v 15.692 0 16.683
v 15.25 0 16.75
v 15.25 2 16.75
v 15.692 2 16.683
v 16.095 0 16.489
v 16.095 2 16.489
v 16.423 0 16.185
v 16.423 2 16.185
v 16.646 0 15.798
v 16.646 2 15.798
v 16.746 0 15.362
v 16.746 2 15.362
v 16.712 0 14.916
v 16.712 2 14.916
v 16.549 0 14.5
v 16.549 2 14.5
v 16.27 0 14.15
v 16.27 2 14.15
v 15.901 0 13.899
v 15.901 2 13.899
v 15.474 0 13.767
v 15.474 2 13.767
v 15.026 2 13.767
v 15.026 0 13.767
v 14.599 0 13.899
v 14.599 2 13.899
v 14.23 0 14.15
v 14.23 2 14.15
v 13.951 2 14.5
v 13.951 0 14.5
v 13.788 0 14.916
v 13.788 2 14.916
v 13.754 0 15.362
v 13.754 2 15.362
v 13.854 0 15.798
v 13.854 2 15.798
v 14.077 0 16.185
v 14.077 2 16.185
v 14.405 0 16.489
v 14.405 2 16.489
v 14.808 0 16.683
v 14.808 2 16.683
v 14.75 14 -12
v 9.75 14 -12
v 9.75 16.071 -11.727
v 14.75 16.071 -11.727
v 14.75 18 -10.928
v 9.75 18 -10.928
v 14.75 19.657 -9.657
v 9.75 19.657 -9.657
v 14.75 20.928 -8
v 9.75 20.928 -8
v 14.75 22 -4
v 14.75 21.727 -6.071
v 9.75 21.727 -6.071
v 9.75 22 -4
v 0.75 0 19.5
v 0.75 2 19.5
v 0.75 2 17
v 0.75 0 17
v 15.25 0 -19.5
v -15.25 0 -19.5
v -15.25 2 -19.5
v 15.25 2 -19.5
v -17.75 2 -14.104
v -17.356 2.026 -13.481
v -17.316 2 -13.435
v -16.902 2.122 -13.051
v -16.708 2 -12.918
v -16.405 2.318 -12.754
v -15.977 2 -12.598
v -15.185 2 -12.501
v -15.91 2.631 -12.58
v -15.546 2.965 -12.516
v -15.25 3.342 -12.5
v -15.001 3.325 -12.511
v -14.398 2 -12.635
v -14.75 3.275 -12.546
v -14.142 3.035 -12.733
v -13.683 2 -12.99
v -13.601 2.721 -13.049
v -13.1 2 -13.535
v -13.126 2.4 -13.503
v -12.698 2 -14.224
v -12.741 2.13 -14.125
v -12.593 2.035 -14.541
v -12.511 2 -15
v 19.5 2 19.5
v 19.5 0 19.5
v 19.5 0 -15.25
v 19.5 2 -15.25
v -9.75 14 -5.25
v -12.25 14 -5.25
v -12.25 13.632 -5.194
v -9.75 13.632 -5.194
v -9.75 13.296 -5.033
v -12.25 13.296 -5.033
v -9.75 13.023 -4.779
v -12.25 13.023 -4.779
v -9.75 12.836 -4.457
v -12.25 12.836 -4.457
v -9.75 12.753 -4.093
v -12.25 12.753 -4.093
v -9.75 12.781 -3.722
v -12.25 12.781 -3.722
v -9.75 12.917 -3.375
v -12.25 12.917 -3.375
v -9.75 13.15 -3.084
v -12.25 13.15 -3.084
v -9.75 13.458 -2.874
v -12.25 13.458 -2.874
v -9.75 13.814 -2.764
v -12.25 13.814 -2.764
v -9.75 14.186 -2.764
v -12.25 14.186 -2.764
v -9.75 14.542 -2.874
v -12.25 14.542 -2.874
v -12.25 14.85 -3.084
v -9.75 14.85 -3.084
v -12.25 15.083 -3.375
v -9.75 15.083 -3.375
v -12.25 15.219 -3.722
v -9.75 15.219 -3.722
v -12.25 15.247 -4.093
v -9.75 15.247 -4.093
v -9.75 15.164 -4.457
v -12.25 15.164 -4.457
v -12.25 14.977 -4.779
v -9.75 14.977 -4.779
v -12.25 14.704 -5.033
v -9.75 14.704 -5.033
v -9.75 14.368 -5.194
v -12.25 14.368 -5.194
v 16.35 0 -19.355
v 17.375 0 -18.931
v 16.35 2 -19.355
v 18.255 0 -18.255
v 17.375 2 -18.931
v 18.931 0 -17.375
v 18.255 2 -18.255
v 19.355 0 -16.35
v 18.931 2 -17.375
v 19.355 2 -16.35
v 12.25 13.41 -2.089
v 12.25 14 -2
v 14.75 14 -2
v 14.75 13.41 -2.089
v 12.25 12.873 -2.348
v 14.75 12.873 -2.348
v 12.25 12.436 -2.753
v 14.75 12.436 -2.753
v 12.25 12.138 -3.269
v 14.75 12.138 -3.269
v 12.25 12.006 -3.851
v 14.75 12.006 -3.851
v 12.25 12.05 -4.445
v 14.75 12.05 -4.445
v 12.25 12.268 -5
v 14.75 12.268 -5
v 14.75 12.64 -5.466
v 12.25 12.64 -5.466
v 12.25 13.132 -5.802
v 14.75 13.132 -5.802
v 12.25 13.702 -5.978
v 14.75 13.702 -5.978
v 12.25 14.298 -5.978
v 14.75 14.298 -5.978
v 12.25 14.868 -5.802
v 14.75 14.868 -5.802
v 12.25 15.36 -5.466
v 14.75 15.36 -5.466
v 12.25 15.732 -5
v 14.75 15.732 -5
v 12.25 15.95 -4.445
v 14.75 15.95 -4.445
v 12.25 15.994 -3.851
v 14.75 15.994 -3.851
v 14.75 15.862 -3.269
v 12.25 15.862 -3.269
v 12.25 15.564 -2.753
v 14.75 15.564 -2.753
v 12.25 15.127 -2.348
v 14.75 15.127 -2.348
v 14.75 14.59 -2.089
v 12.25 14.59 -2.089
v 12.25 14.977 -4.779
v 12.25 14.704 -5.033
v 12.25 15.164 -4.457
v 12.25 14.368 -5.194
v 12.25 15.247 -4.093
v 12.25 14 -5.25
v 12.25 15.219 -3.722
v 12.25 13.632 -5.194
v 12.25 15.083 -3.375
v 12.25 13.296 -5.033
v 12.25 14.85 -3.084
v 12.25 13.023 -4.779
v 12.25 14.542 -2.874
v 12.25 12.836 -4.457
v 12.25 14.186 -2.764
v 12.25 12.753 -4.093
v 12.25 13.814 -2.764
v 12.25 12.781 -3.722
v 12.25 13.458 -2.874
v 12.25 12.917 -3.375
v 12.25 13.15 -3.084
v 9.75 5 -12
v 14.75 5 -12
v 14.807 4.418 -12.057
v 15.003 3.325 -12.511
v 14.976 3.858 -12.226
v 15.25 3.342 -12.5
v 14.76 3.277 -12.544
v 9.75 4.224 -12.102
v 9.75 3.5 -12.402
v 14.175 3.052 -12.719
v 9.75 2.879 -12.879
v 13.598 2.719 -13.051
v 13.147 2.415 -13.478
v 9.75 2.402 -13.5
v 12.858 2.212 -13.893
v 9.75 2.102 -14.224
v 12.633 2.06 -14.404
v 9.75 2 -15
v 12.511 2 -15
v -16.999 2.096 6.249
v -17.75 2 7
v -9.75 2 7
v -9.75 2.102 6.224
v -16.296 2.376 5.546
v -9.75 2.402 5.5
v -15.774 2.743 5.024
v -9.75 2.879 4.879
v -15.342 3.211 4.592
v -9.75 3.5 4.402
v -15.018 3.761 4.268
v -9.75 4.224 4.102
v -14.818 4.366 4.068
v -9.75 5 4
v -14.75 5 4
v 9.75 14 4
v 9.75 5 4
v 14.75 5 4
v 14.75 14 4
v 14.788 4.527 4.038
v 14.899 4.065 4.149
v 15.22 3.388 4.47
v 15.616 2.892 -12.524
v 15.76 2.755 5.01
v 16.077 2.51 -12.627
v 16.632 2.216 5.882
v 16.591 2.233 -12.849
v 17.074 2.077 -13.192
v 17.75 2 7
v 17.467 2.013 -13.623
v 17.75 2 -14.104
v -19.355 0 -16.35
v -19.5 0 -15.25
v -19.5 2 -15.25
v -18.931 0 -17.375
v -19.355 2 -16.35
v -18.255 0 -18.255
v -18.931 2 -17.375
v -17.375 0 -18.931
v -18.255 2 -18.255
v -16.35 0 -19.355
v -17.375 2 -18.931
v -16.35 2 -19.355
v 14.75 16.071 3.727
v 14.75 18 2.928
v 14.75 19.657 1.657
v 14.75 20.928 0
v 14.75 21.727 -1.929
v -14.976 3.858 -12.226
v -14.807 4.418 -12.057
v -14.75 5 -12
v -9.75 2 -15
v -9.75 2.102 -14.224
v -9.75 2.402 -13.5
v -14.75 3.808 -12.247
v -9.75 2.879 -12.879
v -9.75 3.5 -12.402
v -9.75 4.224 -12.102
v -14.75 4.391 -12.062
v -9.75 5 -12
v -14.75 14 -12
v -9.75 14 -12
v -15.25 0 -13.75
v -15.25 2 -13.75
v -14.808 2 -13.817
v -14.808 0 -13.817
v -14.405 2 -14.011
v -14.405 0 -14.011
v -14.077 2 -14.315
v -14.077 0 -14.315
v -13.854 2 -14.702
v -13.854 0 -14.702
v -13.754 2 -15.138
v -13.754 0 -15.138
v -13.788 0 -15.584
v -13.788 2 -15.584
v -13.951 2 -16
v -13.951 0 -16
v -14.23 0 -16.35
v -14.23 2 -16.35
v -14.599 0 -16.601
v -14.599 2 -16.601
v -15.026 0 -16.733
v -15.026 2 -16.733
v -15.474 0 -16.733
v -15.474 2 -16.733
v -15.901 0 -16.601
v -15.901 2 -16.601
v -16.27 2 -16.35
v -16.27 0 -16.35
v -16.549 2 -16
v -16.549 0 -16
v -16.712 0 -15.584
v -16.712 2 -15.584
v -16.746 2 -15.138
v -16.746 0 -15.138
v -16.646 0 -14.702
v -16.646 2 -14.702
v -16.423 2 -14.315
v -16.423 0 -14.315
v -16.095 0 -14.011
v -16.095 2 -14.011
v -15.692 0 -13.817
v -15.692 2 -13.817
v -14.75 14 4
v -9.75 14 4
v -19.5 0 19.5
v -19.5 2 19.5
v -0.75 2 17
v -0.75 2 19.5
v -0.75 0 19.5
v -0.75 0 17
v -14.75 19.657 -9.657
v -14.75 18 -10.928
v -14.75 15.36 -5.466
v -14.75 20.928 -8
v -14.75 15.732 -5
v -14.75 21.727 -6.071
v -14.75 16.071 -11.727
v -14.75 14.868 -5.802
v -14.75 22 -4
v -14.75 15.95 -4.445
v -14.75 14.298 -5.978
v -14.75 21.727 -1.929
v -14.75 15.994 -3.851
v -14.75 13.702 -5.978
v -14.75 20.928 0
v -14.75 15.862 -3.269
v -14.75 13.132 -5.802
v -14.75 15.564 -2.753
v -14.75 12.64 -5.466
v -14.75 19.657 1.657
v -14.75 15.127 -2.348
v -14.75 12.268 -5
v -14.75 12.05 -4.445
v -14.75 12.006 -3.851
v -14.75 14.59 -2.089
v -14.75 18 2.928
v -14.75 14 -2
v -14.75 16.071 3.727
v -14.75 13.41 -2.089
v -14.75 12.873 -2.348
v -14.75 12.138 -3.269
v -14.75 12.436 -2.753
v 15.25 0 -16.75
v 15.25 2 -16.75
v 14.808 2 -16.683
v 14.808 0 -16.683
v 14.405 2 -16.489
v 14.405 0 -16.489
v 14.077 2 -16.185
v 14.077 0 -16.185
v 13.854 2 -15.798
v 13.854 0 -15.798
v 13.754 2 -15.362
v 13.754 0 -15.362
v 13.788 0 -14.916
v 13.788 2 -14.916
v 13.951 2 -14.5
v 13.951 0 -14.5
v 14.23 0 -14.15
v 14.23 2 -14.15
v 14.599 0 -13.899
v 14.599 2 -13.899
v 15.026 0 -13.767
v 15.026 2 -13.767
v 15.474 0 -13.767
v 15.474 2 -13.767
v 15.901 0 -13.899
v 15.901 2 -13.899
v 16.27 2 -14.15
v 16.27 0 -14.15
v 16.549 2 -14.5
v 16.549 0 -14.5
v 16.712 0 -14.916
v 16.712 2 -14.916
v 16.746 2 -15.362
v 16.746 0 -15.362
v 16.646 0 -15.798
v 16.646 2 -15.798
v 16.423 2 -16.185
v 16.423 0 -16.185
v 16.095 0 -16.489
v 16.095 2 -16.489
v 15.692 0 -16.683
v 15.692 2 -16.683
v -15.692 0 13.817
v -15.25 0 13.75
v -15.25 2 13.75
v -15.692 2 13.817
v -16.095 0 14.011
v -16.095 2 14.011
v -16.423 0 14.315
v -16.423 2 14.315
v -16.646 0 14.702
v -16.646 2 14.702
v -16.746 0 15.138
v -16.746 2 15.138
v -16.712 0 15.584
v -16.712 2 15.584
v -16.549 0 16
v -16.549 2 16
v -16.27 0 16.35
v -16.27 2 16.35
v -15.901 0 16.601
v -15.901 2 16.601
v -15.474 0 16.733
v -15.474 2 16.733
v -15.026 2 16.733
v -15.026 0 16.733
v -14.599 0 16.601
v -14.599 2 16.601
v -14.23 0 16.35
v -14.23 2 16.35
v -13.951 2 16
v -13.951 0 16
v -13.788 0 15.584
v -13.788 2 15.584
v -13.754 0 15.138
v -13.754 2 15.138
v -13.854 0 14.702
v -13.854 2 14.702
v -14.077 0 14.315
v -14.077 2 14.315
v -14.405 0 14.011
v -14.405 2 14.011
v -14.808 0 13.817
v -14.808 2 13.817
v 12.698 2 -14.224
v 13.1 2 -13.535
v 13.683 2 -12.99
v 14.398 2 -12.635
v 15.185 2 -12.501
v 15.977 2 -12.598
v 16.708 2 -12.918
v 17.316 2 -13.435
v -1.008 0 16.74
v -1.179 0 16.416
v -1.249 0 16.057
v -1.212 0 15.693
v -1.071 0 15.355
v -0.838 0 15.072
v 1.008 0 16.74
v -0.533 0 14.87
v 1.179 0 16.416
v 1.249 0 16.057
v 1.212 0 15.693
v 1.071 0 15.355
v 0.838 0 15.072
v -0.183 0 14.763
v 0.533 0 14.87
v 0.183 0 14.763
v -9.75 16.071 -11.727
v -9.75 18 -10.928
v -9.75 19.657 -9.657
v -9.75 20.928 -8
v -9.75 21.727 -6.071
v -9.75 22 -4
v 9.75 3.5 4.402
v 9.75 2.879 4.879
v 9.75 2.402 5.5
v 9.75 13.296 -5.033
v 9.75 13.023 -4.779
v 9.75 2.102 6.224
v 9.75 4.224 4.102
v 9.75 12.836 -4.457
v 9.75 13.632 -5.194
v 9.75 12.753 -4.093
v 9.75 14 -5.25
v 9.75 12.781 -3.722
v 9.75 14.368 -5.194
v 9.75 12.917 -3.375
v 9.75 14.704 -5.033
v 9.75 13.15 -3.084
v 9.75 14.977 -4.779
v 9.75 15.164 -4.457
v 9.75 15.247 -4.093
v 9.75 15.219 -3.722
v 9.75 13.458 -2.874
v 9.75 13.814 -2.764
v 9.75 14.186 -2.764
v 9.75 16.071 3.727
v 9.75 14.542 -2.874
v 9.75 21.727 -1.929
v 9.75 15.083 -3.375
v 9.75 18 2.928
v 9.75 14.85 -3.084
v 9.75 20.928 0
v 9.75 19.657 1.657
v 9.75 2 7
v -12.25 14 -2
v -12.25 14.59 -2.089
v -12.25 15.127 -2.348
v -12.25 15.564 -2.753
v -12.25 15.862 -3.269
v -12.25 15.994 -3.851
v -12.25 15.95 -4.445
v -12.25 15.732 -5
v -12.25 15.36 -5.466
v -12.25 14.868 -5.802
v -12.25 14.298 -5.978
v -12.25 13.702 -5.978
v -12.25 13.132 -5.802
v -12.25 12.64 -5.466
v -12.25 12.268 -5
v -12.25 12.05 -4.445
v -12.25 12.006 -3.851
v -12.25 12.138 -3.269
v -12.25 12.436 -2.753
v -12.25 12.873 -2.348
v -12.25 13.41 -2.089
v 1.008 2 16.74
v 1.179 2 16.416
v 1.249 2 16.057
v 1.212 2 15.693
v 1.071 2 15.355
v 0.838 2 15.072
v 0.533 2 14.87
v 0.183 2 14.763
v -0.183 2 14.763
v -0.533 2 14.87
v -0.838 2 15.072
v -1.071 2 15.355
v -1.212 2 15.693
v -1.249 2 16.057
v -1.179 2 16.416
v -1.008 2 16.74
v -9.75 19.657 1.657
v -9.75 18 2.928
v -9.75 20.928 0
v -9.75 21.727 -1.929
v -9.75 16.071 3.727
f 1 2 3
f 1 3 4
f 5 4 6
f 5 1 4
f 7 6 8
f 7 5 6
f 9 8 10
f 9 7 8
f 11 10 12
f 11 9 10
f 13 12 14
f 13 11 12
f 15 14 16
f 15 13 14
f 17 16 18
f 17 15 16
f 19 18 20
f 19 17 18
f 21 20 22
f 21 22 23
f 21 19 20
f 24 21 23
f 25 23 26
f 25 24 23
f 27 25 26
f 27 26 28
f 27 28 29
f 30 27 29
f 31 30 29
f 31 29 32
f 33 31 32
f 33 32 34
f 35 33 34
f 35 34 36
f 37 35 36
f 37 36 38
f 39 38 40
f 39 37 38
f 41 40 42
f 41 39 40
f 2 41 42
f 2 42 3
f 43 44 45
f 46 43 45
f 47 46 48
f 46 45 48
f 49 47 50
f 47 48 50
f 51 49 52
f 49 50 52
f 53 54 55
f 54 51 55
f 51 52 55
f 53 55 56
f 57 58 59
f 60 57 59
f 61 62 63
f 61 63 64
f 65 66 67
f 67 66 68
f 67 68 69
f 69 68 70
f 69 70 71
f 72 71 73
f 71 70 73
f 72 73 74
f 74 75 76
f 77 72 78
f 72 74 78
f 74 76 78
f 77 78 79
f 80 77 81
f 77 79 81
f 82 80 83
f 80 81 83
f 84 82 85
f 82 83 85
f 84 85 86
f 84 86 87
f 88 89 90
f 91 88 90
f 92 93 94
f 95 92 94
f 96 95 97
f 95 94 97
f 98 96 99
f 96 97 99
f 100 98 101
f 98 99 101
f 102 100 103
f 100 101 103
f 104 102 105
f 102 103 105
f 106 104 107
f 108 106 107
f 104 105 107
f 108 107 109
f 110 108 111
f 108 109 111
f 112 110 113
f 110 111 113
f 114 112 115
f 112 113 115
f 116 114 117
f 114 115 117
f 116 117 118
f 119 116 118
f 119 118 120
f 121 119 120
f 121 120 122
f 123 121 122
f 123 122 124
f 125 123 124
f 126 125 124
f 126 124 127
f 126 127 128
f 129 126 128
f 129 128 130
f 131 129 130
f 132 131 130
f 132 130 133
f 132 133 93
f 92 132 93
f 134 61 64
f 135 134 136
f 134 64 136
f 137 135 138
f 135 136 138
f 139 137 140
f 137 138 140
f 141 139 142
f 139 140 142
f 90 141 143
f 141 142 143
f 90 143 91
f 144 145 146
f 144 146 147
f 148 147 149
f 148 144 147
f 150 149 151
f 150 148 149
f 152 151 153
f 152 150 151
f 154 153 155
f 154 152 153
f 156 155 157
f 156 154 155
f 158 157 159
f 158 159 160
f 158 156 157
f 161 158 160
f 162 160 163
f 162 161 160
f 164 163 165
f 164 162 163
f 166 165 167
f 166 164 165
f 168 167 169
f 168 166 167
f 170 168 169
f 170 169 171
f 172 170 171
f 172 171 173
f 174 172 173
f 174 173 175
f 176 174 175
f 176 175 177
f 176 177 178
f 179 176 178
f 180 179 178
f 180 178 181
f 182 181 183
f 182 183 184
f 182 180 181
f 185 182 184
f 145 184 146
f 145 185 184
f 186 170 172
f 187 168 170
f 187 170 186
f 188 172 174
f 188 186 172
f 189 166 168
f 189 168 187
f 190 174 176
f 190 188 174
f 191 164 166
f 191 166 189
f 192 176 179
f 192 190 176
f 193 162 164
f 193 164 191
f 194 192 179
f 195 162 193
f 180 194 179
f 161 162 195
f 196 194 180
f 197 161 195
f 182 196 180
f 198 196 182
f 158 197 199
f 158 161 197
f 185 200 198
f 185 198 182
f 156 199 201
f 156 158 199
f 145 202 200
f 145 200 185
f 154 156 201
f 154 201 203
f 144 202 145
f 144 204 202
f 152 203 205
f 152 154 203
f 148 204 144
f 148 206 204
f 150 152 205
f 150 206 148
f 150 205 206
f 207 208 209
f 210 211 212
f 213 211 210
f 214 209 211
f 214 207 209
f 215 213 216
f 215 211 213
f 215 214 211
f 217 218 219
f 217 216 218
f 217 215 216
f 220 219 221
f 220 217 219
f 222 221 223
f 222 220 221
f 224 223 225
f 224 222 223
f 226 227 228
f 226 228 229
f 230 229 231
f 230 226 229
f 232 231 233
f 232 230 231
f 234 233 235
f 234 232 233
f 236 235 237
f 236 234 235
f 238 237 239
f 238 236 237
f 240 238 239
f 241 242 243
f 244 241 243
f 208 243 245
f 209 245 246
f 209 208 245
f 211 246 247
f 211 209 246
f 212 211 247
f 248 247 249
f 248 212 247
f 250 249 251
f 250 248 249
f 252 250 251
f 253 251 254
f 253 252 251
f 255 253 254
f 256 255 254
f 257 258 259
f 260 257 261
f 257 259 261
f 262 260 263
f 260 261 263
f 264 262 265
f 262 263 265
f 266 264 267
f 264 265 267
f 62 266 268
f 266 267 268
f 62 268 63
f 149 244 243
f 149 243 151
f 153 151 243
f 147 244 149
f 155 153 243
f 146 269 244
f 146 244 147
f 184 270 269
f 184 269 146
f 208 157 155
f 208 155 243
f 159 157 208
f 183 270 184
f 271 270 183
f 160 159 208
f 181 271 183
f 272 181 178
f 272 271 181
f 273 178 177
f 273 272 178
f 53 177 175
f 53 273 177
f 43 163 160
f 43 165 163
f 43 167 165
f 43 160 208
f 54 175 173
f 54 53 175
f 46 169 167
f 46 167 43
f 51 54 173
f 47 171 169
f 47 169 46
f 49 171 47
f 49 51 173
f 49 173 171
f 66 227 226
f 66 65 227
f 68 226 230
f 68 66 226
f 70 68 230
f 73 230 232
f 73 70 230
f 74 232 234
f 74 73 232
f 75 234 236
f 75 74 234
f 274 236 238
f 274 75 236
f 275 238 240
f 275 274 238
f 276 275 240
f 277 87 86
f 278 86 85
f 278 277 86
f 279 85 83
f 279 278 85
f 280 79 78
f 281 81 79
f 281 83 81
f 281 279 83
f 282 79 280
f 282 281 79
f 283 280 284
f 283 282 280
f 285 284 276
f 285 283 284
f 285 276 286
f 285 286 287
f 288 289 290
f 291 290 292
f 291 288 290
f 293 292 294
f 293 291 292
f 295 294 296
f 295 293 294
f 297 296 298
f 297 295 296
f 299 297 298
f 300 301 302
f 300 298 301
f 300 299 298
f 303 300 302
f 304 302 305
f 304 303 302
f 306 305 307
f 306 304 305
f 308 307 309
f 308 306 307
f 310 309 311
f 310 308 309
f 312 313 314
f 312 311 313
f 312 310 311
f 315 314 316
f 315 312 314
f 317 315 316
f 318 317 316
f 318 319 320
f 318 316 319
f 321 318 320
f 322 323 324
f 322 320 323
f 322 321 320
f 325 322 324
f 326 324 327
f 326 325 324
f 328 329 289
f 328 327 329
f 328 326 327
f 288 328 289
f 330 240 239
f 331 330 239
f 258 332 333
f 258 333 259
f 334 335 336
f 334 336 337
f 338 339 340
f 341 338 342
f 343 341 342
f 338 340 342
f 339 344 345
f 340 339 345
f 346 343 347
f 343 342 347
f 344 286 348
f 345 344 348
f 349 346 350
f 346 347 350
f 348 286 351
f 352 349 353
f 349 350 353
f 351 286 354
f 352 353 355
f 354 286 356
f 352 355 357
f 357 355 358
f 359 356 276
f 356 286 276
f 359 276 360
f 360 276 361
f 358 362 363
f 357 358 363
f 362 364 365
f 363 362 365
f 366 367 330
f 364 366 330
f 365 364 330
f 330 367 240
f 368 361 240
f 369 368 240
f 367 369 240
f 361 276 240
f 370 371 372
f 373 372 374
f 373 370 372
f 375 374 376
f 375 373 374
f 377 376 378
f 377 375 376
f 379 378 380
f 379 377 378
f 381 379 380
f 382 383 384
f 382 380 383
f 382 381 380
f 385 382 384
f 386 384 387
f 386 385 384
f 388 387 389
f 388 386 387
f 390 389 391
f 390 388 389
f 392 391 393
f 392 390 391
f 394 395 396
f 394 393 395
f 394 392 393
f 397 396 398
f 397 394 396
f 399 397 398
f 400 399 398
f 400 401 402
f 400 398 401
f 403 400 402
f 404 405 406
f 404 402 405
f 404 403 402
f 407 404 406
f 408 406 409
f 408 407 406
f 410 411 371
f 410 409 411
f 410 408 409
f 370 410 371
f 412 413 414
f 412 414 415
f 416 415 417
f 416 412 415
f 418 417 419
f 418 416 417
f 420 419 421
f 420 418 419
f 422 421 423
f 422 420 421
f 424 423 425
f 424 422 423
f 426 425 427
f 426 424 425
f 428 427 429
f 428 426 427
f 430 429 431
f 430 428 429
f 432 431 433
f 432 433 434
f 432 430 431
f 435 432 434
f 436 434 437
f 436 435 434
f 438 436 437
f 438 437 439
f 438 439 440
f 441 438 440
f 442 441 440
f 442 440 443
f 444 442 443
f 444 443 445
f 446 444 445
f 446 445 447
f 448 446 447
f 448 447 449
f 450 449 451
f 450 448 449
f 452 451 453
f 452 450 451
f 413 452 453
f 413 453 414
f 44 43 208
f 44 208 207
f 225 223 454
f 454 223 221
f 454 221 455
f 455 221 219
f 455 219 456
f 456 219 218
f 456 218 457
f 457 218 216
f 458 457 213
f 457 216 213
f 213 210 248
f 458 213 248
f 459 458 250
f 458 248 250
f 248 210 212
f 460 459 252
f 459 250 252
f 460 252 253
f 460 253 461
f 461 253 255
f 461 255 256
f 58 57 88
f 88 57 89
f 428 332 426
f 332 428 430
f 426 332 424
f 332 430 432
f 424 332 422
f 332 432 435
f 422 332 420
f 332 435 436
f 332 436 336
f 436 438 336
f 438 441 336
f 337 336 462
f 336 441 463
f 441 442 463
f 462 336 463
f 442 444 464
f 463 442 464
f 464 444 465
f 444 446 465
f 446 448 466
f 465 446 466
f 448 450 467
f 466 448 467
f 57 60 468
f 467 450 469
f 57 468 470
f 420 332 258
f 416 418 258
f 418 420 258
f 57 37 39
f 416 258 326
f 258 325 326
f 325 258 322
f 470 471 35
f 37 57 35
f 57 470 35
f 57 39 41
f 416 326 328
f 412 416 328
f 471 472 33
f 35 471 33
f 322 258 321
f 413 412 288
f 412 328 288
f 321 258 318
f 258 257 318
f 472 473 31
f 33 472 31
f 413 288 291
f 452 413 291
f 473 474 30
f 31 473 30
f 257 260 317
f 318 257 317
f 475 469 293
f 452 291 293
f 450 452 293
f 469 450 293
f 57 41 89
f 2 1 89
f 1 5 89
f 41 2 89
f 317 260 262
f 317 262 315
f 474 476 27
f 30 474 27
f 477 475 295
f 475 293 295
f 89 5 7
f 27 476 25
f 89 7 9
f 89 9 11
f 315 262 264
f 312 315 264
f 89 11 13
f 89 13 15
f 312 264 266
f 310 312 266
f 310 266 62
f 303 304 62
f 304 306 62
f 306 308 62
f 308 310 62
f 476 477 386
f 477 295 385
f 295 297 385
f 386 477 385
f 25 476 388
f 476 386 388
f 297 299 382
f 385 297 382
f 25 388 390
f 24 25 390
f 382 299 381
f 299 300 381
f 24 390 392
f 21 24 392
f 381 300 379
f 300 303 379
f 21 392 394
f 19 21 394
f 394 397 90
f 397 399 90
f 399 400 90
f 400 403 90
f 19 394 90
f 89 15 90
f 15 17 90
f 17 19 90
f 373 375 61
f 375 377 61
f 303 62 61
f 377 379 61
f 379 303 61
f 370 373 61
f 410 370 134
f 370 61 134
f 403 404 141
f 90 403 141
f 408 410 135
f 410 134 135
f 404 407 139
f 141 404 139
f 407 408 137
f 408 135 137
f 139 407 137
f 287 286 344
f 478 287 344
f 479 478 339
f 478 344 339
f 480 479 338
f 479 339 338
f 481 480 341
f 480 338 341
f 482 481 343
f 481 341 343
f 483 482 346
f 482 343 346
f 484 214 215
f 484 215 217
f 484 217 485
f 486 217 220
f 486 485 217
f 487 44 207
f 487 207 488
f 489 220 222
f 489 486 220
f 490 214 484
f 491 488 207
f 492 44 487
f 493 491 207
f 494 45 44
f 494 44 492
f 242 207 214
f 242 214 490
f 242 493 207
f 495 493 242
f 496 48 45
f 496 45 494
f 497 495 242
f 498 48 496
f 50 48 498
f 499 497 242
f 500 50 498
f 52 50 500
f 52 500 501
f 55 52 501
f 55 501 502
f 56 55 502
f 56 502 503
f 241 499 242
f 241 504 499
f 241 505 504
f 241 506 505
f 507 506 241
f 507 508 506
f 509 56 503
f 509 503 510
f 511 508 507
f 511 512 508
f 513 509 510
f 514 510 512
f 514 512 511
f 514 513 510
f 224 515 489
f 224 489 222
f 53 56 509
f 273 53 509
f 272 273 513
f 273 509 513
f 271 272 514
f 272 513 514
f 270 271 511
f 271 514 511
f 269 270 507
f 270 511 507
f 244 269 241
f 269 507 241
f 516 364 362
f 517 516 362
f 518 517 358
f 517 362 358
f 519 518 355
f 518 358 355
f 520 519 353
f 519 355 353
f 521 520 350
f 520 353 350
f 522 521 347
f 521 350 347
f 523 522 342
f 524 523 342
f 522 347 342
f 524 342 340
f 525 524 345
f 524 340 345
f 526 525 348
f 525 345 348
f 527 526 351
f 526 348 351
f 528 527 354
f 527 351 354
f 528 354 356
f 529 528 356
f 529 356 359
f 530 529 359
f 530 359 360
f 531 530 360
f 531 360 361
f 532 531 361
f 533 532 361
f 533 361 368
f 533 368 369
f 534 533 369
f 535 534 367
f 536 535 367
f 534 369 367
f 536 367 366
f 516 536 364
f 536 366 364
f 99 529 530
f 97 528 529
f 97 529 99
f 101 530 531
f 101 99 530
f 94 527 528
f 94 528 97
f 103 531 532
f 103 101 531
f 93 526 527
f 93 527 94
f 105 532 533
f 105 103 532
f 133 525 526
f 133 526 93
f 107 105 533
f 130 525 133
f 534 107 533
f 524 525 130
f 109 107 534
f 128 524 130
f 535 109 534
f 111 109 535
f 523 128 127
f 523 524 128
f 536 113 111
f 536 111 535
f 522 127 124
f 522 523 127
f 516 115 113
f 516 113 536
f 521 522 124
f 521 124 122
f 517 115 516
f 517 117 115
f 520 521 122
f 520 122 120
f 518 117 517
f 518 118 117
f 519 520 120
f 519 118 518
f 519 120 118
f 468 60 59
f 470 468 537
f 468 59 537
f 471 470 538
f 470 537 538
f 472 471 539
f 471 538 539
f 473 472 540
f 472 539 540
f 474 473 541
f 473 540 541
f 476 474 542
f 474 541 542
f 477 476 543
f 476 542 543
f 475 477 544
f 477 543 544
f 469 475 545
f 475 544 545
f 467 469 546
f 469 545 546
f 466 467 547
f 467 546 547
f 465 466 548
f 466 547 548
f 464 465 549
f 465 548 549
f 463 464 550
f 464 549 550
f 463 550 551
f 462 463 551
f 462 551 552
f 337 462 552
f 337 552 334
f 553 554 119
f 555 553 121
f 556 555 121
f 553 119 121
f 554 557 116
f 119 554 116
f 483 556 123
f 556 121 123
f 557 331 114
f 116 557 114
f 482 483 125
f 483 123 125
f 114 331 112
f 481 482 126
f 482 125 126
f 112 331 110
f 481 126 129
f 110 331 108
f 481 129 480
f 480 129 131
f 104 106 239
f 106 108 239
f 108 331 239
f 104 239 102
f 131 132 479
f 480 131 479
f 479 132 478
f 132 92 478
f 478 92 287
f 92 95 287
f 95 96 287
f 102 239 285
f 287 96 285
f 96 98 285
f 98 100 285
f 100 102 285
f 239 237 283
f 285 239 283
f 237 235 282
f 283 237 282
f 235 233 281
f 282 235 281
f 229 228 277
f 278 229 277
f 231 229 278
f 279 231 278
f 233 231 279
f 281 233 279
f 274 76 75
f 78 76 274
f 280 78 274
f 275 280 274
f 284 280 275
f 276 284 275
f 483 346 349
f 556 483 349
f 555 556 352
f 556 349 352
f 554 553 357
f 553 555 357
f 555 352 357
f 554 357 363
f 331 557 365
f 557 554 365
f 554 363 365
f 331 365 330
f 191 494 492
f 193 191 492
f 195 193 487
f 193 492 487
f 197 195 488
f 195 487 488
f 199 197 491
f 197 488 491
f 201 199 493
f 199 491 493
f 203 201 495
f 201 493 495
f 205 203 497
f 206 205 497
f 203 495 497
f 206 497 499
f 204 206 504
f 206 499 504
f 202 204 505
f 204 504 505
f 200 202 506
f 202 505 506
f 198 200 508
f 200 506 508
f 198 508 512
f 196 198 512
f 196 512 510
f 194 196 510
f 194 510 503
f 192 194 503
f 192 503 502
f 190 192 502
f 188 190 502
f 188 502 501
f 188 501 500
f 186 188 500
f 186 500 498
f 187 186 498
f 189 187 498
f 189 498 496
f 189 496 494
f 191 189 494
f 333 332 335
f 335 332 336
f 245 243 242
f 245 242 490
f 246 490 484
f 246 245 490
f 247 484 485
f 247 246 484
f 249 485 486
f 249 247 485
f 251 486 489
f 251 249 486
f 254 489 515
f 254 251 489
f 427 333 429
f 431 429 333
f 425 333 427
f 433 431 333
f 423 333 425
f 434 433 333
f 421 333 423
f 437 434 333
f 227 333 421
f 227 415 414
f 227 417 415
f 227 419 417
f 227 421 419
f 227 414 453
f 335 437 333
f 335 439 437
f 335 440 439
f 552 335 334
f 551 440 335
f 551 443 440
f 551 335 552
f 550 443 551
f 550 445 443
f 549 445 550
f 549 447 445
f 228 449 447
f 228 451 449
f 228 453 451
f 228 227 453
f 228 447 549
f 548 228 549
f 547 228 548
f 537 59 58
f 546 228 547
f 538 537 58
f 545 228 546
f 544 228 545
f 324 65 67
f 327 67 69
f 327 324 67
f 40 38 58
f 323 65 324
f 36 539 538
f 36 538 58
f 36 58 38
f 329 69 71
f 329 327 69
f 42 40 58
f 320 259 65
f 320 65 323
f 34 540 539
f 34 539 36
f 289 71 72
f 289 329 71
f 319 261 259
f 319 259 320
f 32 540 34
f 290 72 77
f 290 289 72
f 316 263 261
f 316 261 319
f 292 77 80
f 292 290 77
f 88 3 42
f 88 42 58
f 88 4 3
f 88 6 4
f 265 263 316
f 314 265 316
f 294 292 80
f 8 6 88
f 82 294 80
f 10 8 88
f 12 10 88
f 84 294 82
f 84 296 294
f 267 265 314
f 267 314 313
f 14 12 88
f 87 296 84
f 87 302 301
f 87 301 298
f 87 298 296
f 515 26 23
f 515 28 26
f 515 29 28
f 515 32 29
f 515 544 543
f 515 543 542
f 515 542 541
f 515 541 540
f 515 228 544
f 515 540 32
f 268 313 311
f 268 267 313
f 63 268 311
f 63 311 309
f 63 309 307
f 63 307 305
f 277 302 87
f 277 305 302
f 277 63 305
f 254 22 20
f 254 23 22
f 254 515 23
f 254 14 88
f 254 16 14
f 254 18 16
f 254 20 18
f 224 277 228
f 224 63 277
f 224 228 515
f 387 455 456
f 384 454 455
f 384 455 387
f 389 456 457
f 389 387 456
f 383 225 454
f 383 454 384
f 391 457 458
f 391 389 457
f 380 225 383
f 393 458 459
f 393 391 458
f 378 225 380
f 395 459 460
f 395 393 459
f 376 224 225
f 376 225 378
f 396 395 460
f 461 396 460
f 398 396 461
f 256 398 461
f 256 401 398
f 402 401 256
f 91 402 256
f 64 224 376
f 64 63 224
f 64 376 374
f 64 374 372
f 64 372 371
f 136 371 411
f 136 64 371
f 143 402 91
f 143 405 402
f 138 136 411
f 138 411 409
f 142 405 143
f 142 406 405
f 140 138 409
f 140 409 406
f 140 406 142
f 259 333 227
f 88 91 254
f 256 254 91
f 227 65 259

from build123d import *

# Parameters (mm, degrees)
SKETCH1_W           = 39
SKETCH1_H           = 39
SKETCH1_R           = 1.5
BOSS_EXTRUDE1_DEPTH = 2
SKETCH2_W           = 5
SKETCH2_H           = 16
BOSS_EXTRUDE2_DEPTH = 20
CUT_EXTRUDE1_REACH  = 47.137
SKETCH3_R           = 1.25
CUT_EXTRUDE2_REACH  = 36.066
SKETCH4_R           = 1.25
SKETCH4_W           = 1.5
SKETCH4_H           = 3.5
FILLET1_R           = 3
SKETCH6_R           = 2
CUT_EXTRUDE3_DEPTH  = 2.5
CUT_EXTRUDE4_START  = -2.5
SKETCH7_R           = 2
CUT_EXTRUDE4_DEPTH  = 2.5
SKETCH8_R           = 2.75
CUT_EXTRUDE5_DEPTH  = 20


with BuildPart() as part:
    # Sketch1 → Boss-Extrude1 (new body)
    with BuildSketch(Plane(origin=(0, 0, 0), x_dir=(1, 0, 0), z_dir=(0, 1, 0))):
        Rectangle(SKETCH1_W, SKETCH1_H)
        with Locations(Location((-15.25, 15.25, 0), (0, 0, 270))):
            Circle(SKETCH1_R, mode=Mode.SUBTRACT)
        with Locations(Location((15.25, 15.25, 0), (0, 0, 90))):
            Circle(SKETCH1_R, mode=Mode.SUBTRACT)
        with Locations(Location((15.25, -15.25, 0), (0, 0, 270))):
            Circle(SKETCH1_R, mode=Mode.SUBTRACT)
        with Locations(Location((-15.25, -15.25, 0), (0, 0, 90))):
            Circle(SKETCH1_R, mode=Mode.SUBTRACT)
    extrude(amount=BOSS_EXTRUDE1_DEPTH)

    # Sketch2 → Boss-Extrude2 (add)
    with BuildSketch(Plane(origin=(0, 2, 0), x_dir=(1, 0, 0), z_dir=(0, 1, 0))):
        with Locations((-12.25, 4)):
            Rectangle(SKETCH2_W, SKETCH2_H)
        with Locations((12.25, 4)):
            Rectangle(SKETCH2_W, SKETCH2_H)
    extrude(amount=BOSS_EXTRUDE2_DEPTH)

    # Cut-Extrude1: up to this face of the body (flat: up to its plane)
    cut_extrude1_end = Plane(part.part.faces().sort_by_distance((14.75, 12, -4))[0])
    # Sketch3 → Cut-Extrude1 (cut, up to the picked face)
    with BuildSketch(Plane.ZY.offset(14.75), mode=Mode.PRIVATE) as cut_extrude1_sk1:
        with BuildLine():
            Line((-12, 22), (-12, 14))
            ThreePointArc((-12, 14), (-9.656854249, 19.656854249), (-4, 22))
            Line((-4, 22), (-12, 22))
        make_face()
    cut_extrude1_tool1 = split(extrude(cut_extrude1_sk1.sketch, amount=-CUT_EXTRUDE1_REACH, mode=Mode.PRIVATE), bisect_by=cut_extrude1_end, keep=Keep.BOTH, mode=Mode.PRIVATE)
    # Sketch3 → Cut-Extrude1 (cut, up to the picked face)
    with BuildSketch(Plane.ZY.offset(14.75), mode=Mode.PRIVATE) as cut_extrude1_sk2:
        with BuildLine():
            ThreePointArc((-4, 22), (1.656854249, 19.656854249), (4, 14))
            Line((4, 14), (4, 22))
            Line((4, 22), (-4, 22))
        make_face()
    cut_extrude1_tool2 = split(extrude(cut_extrude1_sk2.sketch, amount=-CUT_EXTRUDE1_REACH, mode=Mode.PRIVATE), bisect_by=cut_extrude1_end, keep=Keep.BOTH, mode=Mode.PRIVATE)
    # Sketch3 → Cut-Extrude1 (cut, up to the picked face)
    with BuildSketch(Plane.ZY.offset(14.75), mode=Mode.PRIVATE) as cut_extrude1_sk3:
        with Locations(Location((-4, 14, 0), (0, 0, 180))):
            Circle(SKETCH3_R)
    cut_extrude1_tool3 = split(extrude(cut_extrude1_sk3.sketch, amount=-CUT_EXTRUDE1_REACH, mode=Mode.PRIVATE), bisect_by=cut_extrude1_end, keep=Keep.BOTH, mode=Mode.PRIVATE)
    add(cut_extrude1_tool1.solids().sort_by(Axis((-14.75, 20.213056, -10.213056), (1, 0, 0)))[0], mode=Mode.SUBTRACT)
    add(cut_extrude1_tool2.solids().sort_by(Axis((-14.75, 20.213056, 2.213056), (1, 0, 0)))[0], mode=Mode.SUBTRACT)
    add(cut_extrude1_tool3.solids().sort_by(Axis((-14.75, 14, -4), (1, 0, 0)))[0], mode=Mode.SUBTRACT)

    # Sketch4 → Cut-Extrude2 (cut, up to next)
    with BuildSketch(Plane(origin=(0, 2, 0), x_dir=(1, 0, 0), z_dir=(0, 1, 0)), mode=Mode.PRIVATE) as cut_extrude2_sk1:
        with BuildLine():
            Line((-19.5, 19.5), (-19.5, 15.25))
            ThreePointArc((-19.5, 15.25), (-18.25520382, 18.25520382), (-15.249999999, 19.5))
            Line((-15.249999999, 19.5), (-19.5, 19.5))
        make_face()
    cut_extrude2_tool1 = extrude(cut_extrude2_sk1.sketch, amount=-CUT_EXTRUDE2_REACH, mode=Mode.PRIVATE) & part.part
    # Sketch4 → Cut-Extrude2 (cut, up to next)
    with BuildSketch(Plane(origin=(0, 2, 0), x_dir=(1, 0, 0), z_dir=(0, 1, 0)), mode=Mode.PRIVATE) as cut_extrude2_sk2:
        with BuildLine():
            ThreePointArc((15.25, 19.5), (18.25520382, 18.25520382), (19.5, 15.25))
            Line((19.5, 15.25), (19.5, 19.5))
            Line((19.5, 19.5), (15.25, 19.5))
        make_face()
    cut_extrude2_tool2 = extrude(cut_extrude2_sk2.sketch, amount=-CUT_EXTRUDE2_REACH, mode=Mode.PRIVATE) & part.part
    # Sketch4 → Cut-Extrude2 (cut, up to next)
    with BuildSketch(Plane(origin=(0, 2, 0), x_dir=(1, 0, 0), z_dir=(0, 1, 0)), mode=Mode.PRIVATE) as cut_extrude2_sk3:
        with Locations((0, -16)):
            Circle(SKETCH4_R)
    cut_extrude2_tool3 = extrude(cut_extrude2_sk3.sketch, amount=-CUT_EXTRUDE2_REACH, mode=Mode.PRIVATE) & part.part
    # Sketch4 → Cut-Extrude2 (cut, up to next)
    with BuildSketch(Plane(origin=(0, 2, 0), x_dir=(1, 0, 0), z_dir=(0, 1, 0)), mode=Mode.PRIVATE) as cut_extrude2_sk4:
        with Locations((0, -17.75)):
            Rectangle(SKETCH4_W, SKETCH4_H)
    cut_extrude2_tool4 = extrude(cut_extrude2_sk4.sketch, amount=-CUT_EXTRUDE2_REACH, mode=Mode.PRIVATE) & part.part
    add(cut_extrude2_tool1.solids().sort_by_distance((-18.550686, 2, -18.550686))[0], mode=Mode.SUBTRACT)
    add(cut_extrude2_tool2.solids().sort_by_distance((18.550686, 2, -18.550686))[0], mode=Mode.SUBTRACT)
    add(cut_extrude2_tool3.solids().sort_by_distance((0, 2, 16))[0], mode=Mode.SUBTRACT)
    add(cut_extrude2_tool4.solids().sort_by_distance((0, 2, 17.75))[0], mode=Mode.SUBTRACT)

    # Fillet1
    # the kernel refuses this fillet: 3 mm, written as the material it adds along each edge
    with BuildSketch(Plane(origin=(-9.75, 2, -12), x_dir=(0, 0, -1), z_dir=(-1, 0, 0))) as fillet1_piece_1_section:
        with BuildLine():
            CenterArc((FILLET1_R, -FILLET1_R), FILLET1_R, 90, 90)
            Line((0, -FILLET1_R), (0, 0))
            Line((0, 0), (FILLET1_R, 0))
        make_face()
    fillet1_piece_1 = extrude(amount=5, mode=Mode.PRIVATE)
    fillet1_piece_1 = fillet1_piece_1 - Plane(origin=(-15.25, 2.68425546, -15.25), x_dir=(0, 0, 1), z_dir=(0, -1, 0)) * Cylinder(1.5, 23, mode=Mode.PRIVATE)
    add(fillet1_piece_1)
    with BuildSketch(Plane(origin=(-14.75, 2, -12), x_dir=(-1, 0, 0), z_dir=(0, 0, 1))) as fillet1_piece_2:
        with BuildLine():
            CenterArc((FILLET1_R, -FILLET1_R), FILLET1_R, 90, 90)
            Line((0, -FILLET1_R), (0, 0))
            Line((0, 0), (FILLET1_R, 0))
        make_face()
    extrude(amount=16)
    with BuildSketch(Plane(origin=(-14.75, 2, 4), x_dir=(0, 0, 1), z_dir=(1, 0, 0))) as fillet1_piece_3:
        with BuildLine():
            CenterArc((FILLET1_R, -FILLET1_R), FILLET1_R, 90, 90)
            Line((0, -FILLET1_R), (0, 0))
            Line((0, 0), (FILLET1_R, 0))
        make_face()
    extrude(amount=5)
    with BuildSketch(Plane(origin=(14.75, 2, 4), x_dir=(0, 0, 1), z_dir=(-1, 0, 0))) as fillet1_piece_4:
        with BuildLine():
            CenterArc((FILLET1_R, FILLET1_R), FILLET1_R, 180, 90)
            Line((0, FILLET1_R), (0, 0))
            Line((0, 0), (FILLET1_R, 0))
        make_face()
    extrude(amount=5)
    with BuildSketch(Plane(origin=(14.75, 2, -12), x_dir=(1, 0, 0), z_dir=(0, 0, 1))) as fillet1_piece_5:
        with BuildLine():
            CenterArc((FILLET1_R, FILLET1_R), FILLET1_R, 180, 90)
            Line((0, FILLET1_R), (0, 0))
            Line((0, 0), (FILLET1_R, 0))
        make_face()
    extrude(amount=16)
    with BuildSketch(Plane(origin=(9.75, 2, -12), x_dir=(0, 0, -1), z_dir=(1, 0, 0))) as fillet1_piece_6_section:
        with BuildLine():
            CenterArc((FILLET1_R, FILLET1_R), FILLET1_R, 180, 90)
            Line((0, FILLET1_R), (0, 0))
            Line((0, 0), (FILLET1_R, 0))
        make_face()
    fillet1_piece_6 = extrude(amount=5, mode=Mode.PRIVATE)
    fillet1_piece_6 = fillet1_piece_6 - Plane(origin=(15.25, 2.684255461, -15.25), x_dir=(0, 0, -1), z_dir=(0, -1, 0)) * Cylinder(1.5, 22, mode=Mode.PRIVATE)
    add(fillet1_piece_6)
    with BuildSketch(Plane(origin=(-9.75, 2, -12), x_dir=(0, 0, -1), z_dir=(-1, 0, 0))) as fillet1_piece_7a_section:
        with BuildLine():
            CenterArc((FILLET1_R, -FILLET1_R), FILLET1_R, 90, 90)
            Line((0, -FILLET1_R), (0, 0))
            Line((0, 0), (FILLET1_R, 0))
        make_face()
    fillet1_piece_7a = extrude(amount=12.5, mode=Mode.PRIVATE)
    fillet1_piece_7a = split(fillet1_piece_7a, bisect_by=Plane(origin=(-19.5, 2.695389127, -12.63970839), z_dir=(1, 0, 0)), keep=Keep.TOP, mode=Mode.PRIVATE)
    fillet1_piece_7a = fillet1_piece_7a - Plane(origin=(-15.25, 2.695389127, -15.25), x_dir=(0, 0, 1), z_dir=(0, -1, 0)) * Cylinder(1.5, 37, mode=Mode.PRIVATE)
    fillet1_piece_7a = split(fillet1_piece_7a, bisect_by=Plane(origin=(-14.75, 2.695389127, -12.63970839), z_dir=(-1, 0, 0)), keep=Keep.TOP, mode=Mode.PRIVATE)
    with BuildSketch(Plane(origin=(-14.75, 2, -19.5), x_dir=(-1, 0, 0), z_dir=(0, 0, 1))) as fillet1_piece_7b_section:
        with BuildLine():
            CenterArc((FILLET1_R, -FILLET1_R), FILLET1_R, 90, 90)
            Line((0, -FILLET1_R), (0, 0))
            Line((0, 0), (FILLET1_R, 0))
        make_face()
    fillet1_piece_7b = extrude(amount=23.5, mode=Mode.PRIVATE)
    fillet1_piece_7b = fillet1_piece_7b & Plane(origin=(-15.25, 2.080720084, -15.25), x_dir=(-1, 0, 0), z_dir=(0, 1, 0)) * Cylinder(4.25, 59, mode=Mode.PRIVATE)
    fillet1_piece_7b = fillet1_piece_7b - Plane(origin=(-15.25, 2.080720084, -15.25), x_dir=(0, 0, 1), z_dir=(0, -1, 0)) * Cylinder(1.5, 59, mode=Mode.PRIVATE)
    fillet1_piece_7b = split(fillet1_piece_7b, bisect_by=Plane(origin=(-16.967781304, 2.080720084, -12), z_dir=(0, 0, -1)), keep=Keep.TOP, mode=Mode.PRIVATE)
    fillet1_piece_7 = fillet1_piece_7a & fillet1_piece_7b
    add(fillet1_piece_7)
    with BuildSketch(Plane(origin=(-22.25, 2, 4), x_dir=(0, 0, 1), z_dir=(1, 0, 0))) as fillet1_piece_8a_section:
        with BuildLine():
            CenterArc((FILLET1_R, -FILLET1_R), FILLET1_R, 90, 90)
            Line((0, -FILLET1_R), (0, 0))
            Line((0, 0), (FILLET1_R, 0))
        make_face()
    fillet1_piece_8a = extrude(amount=12.5, mode=Mode.PRIVATE)
    fillet1_piece_8a = split(fillet1_piece_8a, bisect_by=Plane(origin=(-19.5, 2.679185343, 4.679185343), z_dir=(1, 0, 0)), keep=Keep.TOP, mode=Mode.PRIVATE)
    fillet1_piece_8a = split(fillet1_piece_8a, bisect_by=Plane(origin=(-14.75, 2.679185343, 4.679185343), z_dir=(-1, 0, 0)), keep=Keep.TOP, mode=Mode.PRIVATE)
    with BuildSketch(Plane(origin=(-14.75, 2, -12), x_dir=(-1, 0, 0), z_dir=(0, 0, 1))) as fillet1_piece_8b_section:
        with BuildLine():
            CenterArc((FILLET1_R, -FILLET1_R), FILLET1_R, 90, 90)
            Line((0, -FILLET1_R), (0, 0))
            Line((0, 0), (FILLET1_R, 0))
        make_face()
    fillet1_piece_8b = extrude(amount=23.5, mode=Mode.PRIVATE)
    fillet1_piece_8b = split(fillet1_piece_8b, bisect_by=Plane(origin=(-15.429185343, 2.679185343, 4), z_dir=(0, 0, 1)), keep=Keep.TOP, mode=Mode.PRIVATE)
    fillet1_piece_8 = fillet1_piece_8a & fillet1_piece_8b
    add(fillet1_piece_8)
    with BuildSketch(Plane(origin=(14.75, 2, -12), x_dir=(1, 0, 0), z_dir=(0, 0, 1))) as fillet1_piece_9a_section:
        with BuildLine():
            CenterArc((FILLET1_R, FILLET1_R), FILLET1_R, 180, 90)
            Line((0, FILLET1_R), (0, 0))
            Line((0, 0), (FILLET1_R, 0))
        make_face()
    fillet1_piece_9a = extrude(amount=23.5, mode=Mode.PRIVATE)
    fillet1_piece_9a = split(fillet1_piece_9a, bisect_by=Plane(origin=(15.429185343, 2.679185343, 4), z_dir=(0, 0, 1)), keep=Keep.TOP, mode=Mode.PRIVATE)
    with BuildSketch(Plane(origin=(22.25, 2, 4), x_dir=(0, 0, 1), z_dir=(-1, 0, 0))) as fillet1_piece_9b_section:
        with BuildLine():
            CenterArc((FILLET1_R, FILLET1_R), FILLET1_R, 180, 90)
            Line((0, FILLET1_R), (0, 0))
            Line((0, 0), (FILLET1_R, 0))
        make_face()
    fillet1_piece_9b = extrude(amount=12.5, mode=Mode.PRIVATE)
    fillet1_piece_9b = split(fillet1_piece_9b, bisect_by=Plane(origin=(19.5, 2.679185343, 4.679185343), z_dir=(-1, 0, 0)), keep=Keep.TOP, mode=Mode.PRIVATE)
    fillet1_piece_9b = split(fillet1_piece_9b, bisect_by=Plane(origin=(14.75, 2.679185343, 4.679185343), z_dir=(1, 0, 0)), keep=Keep.TOP, mode=Mode.PRIVATE)
    fillet1_piece_9 = fillet1_piece_9a & fillet1_piece_9b
    add(fillet1_piece_9)
    with BuildSketch(Plane(origin=(14.75, 2, -19.5), x_dir=(1, 0, 0), z_dir=(0, 0, 1))) as fillet1_piece_10a_section:
        with BuildLine():
            CenterArc((FILLET1_R, FILLET1_R), FILLET1_R, 180, 90)
            Line((0, FILLET1_R), (0, 0))
            Line((0, 0), (FILLET1_R, 0))
        make_face()
    fillet1_piece_10a = extrude(amount=23.5, mode=Mode.PRIVATE)
    fillet1_piece_10a = fillet1_piece_10a & Plane(origin=(15.25, 2.080720084, -15.25), x_dir=(0, 0, -1), z_dir=(0, 1, 0)) * Cylinder(4.25, 59, mode=Mode.PRIVATE)
    fillet1_piece_10a = fillet1_piece_10a - Plane(origin=(15.25, 2.080720084, -15.25), x_dir=(0, 0, -1), z_dir=(0, -1, 0)) * Cylinder(1.5, 59, mode=Mode.PRIVATE)
    fillet1_piece_10a = split(fillet1_piece_10a, bisect_by=Plane(origin=(16.967781304, 2.080720084, -12), z_dir=(0, 0, -1)), keep=Keep.TOP, mode=Mode.PRIVATE)
    with BuildSketch(Plane(origin=(9.75, 2, -12), x_dir=(0, 0, -1), z_dir=(1, 0, 0))) as fillet1_piece_10b_section:
        with BuildLine():
            CenterArc((FILLET1_R, FILLET1_R), FILLET1_R, 180, 90)
            Line((0, FILLET1_R), (0, 0))
            Line((0, 0), (FILLET1_R, 0))
        make_face()
    fillet1_piece_10b = extrude(amount=12.5, mode=Mode.PRIVATE)
    fillet1_piece_10b = split(fillet1_piece_10b, bisect_by=Plane(origin=(19.5, 2.695389122, -12.639708406), z_dir=(-1, 0, 0)), keep=Keep.TOP, mode=Mode.PRIVATE)
    fillet1_piece_10b = fillet1_piece_10b - Plane(origin=(15.25, 2.695389122, -15.25), x_dir=(0, 0, -1), z_dir=(0, -1, 0)) * Cylinder(1.5, 37, mode=Mode.PRIVATE)
    fillet1_piece_10b = split(fillet1_piece_10b, bisect_by=Plane(origin=(14.75, 2.695389122, -12.639708406), z_dir=(1, 0, 0)), keep=Keep.TOP, mode=Mode.PRIVATE)
    fillet1_piece_10 = fillet1_piece_10a & fillet1_piece_10b
    add(fillet1_piece_10)

    # Sketch6 → Cut-Extrude3 (cut)
    with BuildSketch(Plane.ZY.offset(14.75)):
        with Locations((-4, 14)):
            Circle(SKETCH6_R)
    extrude(amount=-CUT_EXTRUDE3_DEPTH, mode=Mode.SUBTRACT)

    # Sketch7 → Cut-Extrude4 (cut)
    with BuildSketch(Plane(origin=(14.75, 0, 0), x_dir=(0, 0, -1), z_dir=(1, 0, 0)).offset(CUT_EXTRUDE4_START)):
        with Locations(Location((4, 14, 0), (0, 0, 180))):
            Circle(SKETCH7_R)
    extrude(amount=CUT_EXTRUDE4_DEPTH, mode=Mode.SUBTRACT)

    # Sketch8 → Cut-Extrude5 (cut)
    with BuildSketch(Plane(origin=(0, 22, 0), x_dir=(1, 0, 0), z_dir=(0, 1, 0))):
        with Locations((-15.25, 15.25)):
            Circle(SKETCH8_R)
        with Locations((15.25, 15.25)):
            Circle(SKETCH8_R)
    extrude(amount=-CUT_EXTRUDE5_DEPTH, mode=Mode.SUBTRACT)


solid = part.part
